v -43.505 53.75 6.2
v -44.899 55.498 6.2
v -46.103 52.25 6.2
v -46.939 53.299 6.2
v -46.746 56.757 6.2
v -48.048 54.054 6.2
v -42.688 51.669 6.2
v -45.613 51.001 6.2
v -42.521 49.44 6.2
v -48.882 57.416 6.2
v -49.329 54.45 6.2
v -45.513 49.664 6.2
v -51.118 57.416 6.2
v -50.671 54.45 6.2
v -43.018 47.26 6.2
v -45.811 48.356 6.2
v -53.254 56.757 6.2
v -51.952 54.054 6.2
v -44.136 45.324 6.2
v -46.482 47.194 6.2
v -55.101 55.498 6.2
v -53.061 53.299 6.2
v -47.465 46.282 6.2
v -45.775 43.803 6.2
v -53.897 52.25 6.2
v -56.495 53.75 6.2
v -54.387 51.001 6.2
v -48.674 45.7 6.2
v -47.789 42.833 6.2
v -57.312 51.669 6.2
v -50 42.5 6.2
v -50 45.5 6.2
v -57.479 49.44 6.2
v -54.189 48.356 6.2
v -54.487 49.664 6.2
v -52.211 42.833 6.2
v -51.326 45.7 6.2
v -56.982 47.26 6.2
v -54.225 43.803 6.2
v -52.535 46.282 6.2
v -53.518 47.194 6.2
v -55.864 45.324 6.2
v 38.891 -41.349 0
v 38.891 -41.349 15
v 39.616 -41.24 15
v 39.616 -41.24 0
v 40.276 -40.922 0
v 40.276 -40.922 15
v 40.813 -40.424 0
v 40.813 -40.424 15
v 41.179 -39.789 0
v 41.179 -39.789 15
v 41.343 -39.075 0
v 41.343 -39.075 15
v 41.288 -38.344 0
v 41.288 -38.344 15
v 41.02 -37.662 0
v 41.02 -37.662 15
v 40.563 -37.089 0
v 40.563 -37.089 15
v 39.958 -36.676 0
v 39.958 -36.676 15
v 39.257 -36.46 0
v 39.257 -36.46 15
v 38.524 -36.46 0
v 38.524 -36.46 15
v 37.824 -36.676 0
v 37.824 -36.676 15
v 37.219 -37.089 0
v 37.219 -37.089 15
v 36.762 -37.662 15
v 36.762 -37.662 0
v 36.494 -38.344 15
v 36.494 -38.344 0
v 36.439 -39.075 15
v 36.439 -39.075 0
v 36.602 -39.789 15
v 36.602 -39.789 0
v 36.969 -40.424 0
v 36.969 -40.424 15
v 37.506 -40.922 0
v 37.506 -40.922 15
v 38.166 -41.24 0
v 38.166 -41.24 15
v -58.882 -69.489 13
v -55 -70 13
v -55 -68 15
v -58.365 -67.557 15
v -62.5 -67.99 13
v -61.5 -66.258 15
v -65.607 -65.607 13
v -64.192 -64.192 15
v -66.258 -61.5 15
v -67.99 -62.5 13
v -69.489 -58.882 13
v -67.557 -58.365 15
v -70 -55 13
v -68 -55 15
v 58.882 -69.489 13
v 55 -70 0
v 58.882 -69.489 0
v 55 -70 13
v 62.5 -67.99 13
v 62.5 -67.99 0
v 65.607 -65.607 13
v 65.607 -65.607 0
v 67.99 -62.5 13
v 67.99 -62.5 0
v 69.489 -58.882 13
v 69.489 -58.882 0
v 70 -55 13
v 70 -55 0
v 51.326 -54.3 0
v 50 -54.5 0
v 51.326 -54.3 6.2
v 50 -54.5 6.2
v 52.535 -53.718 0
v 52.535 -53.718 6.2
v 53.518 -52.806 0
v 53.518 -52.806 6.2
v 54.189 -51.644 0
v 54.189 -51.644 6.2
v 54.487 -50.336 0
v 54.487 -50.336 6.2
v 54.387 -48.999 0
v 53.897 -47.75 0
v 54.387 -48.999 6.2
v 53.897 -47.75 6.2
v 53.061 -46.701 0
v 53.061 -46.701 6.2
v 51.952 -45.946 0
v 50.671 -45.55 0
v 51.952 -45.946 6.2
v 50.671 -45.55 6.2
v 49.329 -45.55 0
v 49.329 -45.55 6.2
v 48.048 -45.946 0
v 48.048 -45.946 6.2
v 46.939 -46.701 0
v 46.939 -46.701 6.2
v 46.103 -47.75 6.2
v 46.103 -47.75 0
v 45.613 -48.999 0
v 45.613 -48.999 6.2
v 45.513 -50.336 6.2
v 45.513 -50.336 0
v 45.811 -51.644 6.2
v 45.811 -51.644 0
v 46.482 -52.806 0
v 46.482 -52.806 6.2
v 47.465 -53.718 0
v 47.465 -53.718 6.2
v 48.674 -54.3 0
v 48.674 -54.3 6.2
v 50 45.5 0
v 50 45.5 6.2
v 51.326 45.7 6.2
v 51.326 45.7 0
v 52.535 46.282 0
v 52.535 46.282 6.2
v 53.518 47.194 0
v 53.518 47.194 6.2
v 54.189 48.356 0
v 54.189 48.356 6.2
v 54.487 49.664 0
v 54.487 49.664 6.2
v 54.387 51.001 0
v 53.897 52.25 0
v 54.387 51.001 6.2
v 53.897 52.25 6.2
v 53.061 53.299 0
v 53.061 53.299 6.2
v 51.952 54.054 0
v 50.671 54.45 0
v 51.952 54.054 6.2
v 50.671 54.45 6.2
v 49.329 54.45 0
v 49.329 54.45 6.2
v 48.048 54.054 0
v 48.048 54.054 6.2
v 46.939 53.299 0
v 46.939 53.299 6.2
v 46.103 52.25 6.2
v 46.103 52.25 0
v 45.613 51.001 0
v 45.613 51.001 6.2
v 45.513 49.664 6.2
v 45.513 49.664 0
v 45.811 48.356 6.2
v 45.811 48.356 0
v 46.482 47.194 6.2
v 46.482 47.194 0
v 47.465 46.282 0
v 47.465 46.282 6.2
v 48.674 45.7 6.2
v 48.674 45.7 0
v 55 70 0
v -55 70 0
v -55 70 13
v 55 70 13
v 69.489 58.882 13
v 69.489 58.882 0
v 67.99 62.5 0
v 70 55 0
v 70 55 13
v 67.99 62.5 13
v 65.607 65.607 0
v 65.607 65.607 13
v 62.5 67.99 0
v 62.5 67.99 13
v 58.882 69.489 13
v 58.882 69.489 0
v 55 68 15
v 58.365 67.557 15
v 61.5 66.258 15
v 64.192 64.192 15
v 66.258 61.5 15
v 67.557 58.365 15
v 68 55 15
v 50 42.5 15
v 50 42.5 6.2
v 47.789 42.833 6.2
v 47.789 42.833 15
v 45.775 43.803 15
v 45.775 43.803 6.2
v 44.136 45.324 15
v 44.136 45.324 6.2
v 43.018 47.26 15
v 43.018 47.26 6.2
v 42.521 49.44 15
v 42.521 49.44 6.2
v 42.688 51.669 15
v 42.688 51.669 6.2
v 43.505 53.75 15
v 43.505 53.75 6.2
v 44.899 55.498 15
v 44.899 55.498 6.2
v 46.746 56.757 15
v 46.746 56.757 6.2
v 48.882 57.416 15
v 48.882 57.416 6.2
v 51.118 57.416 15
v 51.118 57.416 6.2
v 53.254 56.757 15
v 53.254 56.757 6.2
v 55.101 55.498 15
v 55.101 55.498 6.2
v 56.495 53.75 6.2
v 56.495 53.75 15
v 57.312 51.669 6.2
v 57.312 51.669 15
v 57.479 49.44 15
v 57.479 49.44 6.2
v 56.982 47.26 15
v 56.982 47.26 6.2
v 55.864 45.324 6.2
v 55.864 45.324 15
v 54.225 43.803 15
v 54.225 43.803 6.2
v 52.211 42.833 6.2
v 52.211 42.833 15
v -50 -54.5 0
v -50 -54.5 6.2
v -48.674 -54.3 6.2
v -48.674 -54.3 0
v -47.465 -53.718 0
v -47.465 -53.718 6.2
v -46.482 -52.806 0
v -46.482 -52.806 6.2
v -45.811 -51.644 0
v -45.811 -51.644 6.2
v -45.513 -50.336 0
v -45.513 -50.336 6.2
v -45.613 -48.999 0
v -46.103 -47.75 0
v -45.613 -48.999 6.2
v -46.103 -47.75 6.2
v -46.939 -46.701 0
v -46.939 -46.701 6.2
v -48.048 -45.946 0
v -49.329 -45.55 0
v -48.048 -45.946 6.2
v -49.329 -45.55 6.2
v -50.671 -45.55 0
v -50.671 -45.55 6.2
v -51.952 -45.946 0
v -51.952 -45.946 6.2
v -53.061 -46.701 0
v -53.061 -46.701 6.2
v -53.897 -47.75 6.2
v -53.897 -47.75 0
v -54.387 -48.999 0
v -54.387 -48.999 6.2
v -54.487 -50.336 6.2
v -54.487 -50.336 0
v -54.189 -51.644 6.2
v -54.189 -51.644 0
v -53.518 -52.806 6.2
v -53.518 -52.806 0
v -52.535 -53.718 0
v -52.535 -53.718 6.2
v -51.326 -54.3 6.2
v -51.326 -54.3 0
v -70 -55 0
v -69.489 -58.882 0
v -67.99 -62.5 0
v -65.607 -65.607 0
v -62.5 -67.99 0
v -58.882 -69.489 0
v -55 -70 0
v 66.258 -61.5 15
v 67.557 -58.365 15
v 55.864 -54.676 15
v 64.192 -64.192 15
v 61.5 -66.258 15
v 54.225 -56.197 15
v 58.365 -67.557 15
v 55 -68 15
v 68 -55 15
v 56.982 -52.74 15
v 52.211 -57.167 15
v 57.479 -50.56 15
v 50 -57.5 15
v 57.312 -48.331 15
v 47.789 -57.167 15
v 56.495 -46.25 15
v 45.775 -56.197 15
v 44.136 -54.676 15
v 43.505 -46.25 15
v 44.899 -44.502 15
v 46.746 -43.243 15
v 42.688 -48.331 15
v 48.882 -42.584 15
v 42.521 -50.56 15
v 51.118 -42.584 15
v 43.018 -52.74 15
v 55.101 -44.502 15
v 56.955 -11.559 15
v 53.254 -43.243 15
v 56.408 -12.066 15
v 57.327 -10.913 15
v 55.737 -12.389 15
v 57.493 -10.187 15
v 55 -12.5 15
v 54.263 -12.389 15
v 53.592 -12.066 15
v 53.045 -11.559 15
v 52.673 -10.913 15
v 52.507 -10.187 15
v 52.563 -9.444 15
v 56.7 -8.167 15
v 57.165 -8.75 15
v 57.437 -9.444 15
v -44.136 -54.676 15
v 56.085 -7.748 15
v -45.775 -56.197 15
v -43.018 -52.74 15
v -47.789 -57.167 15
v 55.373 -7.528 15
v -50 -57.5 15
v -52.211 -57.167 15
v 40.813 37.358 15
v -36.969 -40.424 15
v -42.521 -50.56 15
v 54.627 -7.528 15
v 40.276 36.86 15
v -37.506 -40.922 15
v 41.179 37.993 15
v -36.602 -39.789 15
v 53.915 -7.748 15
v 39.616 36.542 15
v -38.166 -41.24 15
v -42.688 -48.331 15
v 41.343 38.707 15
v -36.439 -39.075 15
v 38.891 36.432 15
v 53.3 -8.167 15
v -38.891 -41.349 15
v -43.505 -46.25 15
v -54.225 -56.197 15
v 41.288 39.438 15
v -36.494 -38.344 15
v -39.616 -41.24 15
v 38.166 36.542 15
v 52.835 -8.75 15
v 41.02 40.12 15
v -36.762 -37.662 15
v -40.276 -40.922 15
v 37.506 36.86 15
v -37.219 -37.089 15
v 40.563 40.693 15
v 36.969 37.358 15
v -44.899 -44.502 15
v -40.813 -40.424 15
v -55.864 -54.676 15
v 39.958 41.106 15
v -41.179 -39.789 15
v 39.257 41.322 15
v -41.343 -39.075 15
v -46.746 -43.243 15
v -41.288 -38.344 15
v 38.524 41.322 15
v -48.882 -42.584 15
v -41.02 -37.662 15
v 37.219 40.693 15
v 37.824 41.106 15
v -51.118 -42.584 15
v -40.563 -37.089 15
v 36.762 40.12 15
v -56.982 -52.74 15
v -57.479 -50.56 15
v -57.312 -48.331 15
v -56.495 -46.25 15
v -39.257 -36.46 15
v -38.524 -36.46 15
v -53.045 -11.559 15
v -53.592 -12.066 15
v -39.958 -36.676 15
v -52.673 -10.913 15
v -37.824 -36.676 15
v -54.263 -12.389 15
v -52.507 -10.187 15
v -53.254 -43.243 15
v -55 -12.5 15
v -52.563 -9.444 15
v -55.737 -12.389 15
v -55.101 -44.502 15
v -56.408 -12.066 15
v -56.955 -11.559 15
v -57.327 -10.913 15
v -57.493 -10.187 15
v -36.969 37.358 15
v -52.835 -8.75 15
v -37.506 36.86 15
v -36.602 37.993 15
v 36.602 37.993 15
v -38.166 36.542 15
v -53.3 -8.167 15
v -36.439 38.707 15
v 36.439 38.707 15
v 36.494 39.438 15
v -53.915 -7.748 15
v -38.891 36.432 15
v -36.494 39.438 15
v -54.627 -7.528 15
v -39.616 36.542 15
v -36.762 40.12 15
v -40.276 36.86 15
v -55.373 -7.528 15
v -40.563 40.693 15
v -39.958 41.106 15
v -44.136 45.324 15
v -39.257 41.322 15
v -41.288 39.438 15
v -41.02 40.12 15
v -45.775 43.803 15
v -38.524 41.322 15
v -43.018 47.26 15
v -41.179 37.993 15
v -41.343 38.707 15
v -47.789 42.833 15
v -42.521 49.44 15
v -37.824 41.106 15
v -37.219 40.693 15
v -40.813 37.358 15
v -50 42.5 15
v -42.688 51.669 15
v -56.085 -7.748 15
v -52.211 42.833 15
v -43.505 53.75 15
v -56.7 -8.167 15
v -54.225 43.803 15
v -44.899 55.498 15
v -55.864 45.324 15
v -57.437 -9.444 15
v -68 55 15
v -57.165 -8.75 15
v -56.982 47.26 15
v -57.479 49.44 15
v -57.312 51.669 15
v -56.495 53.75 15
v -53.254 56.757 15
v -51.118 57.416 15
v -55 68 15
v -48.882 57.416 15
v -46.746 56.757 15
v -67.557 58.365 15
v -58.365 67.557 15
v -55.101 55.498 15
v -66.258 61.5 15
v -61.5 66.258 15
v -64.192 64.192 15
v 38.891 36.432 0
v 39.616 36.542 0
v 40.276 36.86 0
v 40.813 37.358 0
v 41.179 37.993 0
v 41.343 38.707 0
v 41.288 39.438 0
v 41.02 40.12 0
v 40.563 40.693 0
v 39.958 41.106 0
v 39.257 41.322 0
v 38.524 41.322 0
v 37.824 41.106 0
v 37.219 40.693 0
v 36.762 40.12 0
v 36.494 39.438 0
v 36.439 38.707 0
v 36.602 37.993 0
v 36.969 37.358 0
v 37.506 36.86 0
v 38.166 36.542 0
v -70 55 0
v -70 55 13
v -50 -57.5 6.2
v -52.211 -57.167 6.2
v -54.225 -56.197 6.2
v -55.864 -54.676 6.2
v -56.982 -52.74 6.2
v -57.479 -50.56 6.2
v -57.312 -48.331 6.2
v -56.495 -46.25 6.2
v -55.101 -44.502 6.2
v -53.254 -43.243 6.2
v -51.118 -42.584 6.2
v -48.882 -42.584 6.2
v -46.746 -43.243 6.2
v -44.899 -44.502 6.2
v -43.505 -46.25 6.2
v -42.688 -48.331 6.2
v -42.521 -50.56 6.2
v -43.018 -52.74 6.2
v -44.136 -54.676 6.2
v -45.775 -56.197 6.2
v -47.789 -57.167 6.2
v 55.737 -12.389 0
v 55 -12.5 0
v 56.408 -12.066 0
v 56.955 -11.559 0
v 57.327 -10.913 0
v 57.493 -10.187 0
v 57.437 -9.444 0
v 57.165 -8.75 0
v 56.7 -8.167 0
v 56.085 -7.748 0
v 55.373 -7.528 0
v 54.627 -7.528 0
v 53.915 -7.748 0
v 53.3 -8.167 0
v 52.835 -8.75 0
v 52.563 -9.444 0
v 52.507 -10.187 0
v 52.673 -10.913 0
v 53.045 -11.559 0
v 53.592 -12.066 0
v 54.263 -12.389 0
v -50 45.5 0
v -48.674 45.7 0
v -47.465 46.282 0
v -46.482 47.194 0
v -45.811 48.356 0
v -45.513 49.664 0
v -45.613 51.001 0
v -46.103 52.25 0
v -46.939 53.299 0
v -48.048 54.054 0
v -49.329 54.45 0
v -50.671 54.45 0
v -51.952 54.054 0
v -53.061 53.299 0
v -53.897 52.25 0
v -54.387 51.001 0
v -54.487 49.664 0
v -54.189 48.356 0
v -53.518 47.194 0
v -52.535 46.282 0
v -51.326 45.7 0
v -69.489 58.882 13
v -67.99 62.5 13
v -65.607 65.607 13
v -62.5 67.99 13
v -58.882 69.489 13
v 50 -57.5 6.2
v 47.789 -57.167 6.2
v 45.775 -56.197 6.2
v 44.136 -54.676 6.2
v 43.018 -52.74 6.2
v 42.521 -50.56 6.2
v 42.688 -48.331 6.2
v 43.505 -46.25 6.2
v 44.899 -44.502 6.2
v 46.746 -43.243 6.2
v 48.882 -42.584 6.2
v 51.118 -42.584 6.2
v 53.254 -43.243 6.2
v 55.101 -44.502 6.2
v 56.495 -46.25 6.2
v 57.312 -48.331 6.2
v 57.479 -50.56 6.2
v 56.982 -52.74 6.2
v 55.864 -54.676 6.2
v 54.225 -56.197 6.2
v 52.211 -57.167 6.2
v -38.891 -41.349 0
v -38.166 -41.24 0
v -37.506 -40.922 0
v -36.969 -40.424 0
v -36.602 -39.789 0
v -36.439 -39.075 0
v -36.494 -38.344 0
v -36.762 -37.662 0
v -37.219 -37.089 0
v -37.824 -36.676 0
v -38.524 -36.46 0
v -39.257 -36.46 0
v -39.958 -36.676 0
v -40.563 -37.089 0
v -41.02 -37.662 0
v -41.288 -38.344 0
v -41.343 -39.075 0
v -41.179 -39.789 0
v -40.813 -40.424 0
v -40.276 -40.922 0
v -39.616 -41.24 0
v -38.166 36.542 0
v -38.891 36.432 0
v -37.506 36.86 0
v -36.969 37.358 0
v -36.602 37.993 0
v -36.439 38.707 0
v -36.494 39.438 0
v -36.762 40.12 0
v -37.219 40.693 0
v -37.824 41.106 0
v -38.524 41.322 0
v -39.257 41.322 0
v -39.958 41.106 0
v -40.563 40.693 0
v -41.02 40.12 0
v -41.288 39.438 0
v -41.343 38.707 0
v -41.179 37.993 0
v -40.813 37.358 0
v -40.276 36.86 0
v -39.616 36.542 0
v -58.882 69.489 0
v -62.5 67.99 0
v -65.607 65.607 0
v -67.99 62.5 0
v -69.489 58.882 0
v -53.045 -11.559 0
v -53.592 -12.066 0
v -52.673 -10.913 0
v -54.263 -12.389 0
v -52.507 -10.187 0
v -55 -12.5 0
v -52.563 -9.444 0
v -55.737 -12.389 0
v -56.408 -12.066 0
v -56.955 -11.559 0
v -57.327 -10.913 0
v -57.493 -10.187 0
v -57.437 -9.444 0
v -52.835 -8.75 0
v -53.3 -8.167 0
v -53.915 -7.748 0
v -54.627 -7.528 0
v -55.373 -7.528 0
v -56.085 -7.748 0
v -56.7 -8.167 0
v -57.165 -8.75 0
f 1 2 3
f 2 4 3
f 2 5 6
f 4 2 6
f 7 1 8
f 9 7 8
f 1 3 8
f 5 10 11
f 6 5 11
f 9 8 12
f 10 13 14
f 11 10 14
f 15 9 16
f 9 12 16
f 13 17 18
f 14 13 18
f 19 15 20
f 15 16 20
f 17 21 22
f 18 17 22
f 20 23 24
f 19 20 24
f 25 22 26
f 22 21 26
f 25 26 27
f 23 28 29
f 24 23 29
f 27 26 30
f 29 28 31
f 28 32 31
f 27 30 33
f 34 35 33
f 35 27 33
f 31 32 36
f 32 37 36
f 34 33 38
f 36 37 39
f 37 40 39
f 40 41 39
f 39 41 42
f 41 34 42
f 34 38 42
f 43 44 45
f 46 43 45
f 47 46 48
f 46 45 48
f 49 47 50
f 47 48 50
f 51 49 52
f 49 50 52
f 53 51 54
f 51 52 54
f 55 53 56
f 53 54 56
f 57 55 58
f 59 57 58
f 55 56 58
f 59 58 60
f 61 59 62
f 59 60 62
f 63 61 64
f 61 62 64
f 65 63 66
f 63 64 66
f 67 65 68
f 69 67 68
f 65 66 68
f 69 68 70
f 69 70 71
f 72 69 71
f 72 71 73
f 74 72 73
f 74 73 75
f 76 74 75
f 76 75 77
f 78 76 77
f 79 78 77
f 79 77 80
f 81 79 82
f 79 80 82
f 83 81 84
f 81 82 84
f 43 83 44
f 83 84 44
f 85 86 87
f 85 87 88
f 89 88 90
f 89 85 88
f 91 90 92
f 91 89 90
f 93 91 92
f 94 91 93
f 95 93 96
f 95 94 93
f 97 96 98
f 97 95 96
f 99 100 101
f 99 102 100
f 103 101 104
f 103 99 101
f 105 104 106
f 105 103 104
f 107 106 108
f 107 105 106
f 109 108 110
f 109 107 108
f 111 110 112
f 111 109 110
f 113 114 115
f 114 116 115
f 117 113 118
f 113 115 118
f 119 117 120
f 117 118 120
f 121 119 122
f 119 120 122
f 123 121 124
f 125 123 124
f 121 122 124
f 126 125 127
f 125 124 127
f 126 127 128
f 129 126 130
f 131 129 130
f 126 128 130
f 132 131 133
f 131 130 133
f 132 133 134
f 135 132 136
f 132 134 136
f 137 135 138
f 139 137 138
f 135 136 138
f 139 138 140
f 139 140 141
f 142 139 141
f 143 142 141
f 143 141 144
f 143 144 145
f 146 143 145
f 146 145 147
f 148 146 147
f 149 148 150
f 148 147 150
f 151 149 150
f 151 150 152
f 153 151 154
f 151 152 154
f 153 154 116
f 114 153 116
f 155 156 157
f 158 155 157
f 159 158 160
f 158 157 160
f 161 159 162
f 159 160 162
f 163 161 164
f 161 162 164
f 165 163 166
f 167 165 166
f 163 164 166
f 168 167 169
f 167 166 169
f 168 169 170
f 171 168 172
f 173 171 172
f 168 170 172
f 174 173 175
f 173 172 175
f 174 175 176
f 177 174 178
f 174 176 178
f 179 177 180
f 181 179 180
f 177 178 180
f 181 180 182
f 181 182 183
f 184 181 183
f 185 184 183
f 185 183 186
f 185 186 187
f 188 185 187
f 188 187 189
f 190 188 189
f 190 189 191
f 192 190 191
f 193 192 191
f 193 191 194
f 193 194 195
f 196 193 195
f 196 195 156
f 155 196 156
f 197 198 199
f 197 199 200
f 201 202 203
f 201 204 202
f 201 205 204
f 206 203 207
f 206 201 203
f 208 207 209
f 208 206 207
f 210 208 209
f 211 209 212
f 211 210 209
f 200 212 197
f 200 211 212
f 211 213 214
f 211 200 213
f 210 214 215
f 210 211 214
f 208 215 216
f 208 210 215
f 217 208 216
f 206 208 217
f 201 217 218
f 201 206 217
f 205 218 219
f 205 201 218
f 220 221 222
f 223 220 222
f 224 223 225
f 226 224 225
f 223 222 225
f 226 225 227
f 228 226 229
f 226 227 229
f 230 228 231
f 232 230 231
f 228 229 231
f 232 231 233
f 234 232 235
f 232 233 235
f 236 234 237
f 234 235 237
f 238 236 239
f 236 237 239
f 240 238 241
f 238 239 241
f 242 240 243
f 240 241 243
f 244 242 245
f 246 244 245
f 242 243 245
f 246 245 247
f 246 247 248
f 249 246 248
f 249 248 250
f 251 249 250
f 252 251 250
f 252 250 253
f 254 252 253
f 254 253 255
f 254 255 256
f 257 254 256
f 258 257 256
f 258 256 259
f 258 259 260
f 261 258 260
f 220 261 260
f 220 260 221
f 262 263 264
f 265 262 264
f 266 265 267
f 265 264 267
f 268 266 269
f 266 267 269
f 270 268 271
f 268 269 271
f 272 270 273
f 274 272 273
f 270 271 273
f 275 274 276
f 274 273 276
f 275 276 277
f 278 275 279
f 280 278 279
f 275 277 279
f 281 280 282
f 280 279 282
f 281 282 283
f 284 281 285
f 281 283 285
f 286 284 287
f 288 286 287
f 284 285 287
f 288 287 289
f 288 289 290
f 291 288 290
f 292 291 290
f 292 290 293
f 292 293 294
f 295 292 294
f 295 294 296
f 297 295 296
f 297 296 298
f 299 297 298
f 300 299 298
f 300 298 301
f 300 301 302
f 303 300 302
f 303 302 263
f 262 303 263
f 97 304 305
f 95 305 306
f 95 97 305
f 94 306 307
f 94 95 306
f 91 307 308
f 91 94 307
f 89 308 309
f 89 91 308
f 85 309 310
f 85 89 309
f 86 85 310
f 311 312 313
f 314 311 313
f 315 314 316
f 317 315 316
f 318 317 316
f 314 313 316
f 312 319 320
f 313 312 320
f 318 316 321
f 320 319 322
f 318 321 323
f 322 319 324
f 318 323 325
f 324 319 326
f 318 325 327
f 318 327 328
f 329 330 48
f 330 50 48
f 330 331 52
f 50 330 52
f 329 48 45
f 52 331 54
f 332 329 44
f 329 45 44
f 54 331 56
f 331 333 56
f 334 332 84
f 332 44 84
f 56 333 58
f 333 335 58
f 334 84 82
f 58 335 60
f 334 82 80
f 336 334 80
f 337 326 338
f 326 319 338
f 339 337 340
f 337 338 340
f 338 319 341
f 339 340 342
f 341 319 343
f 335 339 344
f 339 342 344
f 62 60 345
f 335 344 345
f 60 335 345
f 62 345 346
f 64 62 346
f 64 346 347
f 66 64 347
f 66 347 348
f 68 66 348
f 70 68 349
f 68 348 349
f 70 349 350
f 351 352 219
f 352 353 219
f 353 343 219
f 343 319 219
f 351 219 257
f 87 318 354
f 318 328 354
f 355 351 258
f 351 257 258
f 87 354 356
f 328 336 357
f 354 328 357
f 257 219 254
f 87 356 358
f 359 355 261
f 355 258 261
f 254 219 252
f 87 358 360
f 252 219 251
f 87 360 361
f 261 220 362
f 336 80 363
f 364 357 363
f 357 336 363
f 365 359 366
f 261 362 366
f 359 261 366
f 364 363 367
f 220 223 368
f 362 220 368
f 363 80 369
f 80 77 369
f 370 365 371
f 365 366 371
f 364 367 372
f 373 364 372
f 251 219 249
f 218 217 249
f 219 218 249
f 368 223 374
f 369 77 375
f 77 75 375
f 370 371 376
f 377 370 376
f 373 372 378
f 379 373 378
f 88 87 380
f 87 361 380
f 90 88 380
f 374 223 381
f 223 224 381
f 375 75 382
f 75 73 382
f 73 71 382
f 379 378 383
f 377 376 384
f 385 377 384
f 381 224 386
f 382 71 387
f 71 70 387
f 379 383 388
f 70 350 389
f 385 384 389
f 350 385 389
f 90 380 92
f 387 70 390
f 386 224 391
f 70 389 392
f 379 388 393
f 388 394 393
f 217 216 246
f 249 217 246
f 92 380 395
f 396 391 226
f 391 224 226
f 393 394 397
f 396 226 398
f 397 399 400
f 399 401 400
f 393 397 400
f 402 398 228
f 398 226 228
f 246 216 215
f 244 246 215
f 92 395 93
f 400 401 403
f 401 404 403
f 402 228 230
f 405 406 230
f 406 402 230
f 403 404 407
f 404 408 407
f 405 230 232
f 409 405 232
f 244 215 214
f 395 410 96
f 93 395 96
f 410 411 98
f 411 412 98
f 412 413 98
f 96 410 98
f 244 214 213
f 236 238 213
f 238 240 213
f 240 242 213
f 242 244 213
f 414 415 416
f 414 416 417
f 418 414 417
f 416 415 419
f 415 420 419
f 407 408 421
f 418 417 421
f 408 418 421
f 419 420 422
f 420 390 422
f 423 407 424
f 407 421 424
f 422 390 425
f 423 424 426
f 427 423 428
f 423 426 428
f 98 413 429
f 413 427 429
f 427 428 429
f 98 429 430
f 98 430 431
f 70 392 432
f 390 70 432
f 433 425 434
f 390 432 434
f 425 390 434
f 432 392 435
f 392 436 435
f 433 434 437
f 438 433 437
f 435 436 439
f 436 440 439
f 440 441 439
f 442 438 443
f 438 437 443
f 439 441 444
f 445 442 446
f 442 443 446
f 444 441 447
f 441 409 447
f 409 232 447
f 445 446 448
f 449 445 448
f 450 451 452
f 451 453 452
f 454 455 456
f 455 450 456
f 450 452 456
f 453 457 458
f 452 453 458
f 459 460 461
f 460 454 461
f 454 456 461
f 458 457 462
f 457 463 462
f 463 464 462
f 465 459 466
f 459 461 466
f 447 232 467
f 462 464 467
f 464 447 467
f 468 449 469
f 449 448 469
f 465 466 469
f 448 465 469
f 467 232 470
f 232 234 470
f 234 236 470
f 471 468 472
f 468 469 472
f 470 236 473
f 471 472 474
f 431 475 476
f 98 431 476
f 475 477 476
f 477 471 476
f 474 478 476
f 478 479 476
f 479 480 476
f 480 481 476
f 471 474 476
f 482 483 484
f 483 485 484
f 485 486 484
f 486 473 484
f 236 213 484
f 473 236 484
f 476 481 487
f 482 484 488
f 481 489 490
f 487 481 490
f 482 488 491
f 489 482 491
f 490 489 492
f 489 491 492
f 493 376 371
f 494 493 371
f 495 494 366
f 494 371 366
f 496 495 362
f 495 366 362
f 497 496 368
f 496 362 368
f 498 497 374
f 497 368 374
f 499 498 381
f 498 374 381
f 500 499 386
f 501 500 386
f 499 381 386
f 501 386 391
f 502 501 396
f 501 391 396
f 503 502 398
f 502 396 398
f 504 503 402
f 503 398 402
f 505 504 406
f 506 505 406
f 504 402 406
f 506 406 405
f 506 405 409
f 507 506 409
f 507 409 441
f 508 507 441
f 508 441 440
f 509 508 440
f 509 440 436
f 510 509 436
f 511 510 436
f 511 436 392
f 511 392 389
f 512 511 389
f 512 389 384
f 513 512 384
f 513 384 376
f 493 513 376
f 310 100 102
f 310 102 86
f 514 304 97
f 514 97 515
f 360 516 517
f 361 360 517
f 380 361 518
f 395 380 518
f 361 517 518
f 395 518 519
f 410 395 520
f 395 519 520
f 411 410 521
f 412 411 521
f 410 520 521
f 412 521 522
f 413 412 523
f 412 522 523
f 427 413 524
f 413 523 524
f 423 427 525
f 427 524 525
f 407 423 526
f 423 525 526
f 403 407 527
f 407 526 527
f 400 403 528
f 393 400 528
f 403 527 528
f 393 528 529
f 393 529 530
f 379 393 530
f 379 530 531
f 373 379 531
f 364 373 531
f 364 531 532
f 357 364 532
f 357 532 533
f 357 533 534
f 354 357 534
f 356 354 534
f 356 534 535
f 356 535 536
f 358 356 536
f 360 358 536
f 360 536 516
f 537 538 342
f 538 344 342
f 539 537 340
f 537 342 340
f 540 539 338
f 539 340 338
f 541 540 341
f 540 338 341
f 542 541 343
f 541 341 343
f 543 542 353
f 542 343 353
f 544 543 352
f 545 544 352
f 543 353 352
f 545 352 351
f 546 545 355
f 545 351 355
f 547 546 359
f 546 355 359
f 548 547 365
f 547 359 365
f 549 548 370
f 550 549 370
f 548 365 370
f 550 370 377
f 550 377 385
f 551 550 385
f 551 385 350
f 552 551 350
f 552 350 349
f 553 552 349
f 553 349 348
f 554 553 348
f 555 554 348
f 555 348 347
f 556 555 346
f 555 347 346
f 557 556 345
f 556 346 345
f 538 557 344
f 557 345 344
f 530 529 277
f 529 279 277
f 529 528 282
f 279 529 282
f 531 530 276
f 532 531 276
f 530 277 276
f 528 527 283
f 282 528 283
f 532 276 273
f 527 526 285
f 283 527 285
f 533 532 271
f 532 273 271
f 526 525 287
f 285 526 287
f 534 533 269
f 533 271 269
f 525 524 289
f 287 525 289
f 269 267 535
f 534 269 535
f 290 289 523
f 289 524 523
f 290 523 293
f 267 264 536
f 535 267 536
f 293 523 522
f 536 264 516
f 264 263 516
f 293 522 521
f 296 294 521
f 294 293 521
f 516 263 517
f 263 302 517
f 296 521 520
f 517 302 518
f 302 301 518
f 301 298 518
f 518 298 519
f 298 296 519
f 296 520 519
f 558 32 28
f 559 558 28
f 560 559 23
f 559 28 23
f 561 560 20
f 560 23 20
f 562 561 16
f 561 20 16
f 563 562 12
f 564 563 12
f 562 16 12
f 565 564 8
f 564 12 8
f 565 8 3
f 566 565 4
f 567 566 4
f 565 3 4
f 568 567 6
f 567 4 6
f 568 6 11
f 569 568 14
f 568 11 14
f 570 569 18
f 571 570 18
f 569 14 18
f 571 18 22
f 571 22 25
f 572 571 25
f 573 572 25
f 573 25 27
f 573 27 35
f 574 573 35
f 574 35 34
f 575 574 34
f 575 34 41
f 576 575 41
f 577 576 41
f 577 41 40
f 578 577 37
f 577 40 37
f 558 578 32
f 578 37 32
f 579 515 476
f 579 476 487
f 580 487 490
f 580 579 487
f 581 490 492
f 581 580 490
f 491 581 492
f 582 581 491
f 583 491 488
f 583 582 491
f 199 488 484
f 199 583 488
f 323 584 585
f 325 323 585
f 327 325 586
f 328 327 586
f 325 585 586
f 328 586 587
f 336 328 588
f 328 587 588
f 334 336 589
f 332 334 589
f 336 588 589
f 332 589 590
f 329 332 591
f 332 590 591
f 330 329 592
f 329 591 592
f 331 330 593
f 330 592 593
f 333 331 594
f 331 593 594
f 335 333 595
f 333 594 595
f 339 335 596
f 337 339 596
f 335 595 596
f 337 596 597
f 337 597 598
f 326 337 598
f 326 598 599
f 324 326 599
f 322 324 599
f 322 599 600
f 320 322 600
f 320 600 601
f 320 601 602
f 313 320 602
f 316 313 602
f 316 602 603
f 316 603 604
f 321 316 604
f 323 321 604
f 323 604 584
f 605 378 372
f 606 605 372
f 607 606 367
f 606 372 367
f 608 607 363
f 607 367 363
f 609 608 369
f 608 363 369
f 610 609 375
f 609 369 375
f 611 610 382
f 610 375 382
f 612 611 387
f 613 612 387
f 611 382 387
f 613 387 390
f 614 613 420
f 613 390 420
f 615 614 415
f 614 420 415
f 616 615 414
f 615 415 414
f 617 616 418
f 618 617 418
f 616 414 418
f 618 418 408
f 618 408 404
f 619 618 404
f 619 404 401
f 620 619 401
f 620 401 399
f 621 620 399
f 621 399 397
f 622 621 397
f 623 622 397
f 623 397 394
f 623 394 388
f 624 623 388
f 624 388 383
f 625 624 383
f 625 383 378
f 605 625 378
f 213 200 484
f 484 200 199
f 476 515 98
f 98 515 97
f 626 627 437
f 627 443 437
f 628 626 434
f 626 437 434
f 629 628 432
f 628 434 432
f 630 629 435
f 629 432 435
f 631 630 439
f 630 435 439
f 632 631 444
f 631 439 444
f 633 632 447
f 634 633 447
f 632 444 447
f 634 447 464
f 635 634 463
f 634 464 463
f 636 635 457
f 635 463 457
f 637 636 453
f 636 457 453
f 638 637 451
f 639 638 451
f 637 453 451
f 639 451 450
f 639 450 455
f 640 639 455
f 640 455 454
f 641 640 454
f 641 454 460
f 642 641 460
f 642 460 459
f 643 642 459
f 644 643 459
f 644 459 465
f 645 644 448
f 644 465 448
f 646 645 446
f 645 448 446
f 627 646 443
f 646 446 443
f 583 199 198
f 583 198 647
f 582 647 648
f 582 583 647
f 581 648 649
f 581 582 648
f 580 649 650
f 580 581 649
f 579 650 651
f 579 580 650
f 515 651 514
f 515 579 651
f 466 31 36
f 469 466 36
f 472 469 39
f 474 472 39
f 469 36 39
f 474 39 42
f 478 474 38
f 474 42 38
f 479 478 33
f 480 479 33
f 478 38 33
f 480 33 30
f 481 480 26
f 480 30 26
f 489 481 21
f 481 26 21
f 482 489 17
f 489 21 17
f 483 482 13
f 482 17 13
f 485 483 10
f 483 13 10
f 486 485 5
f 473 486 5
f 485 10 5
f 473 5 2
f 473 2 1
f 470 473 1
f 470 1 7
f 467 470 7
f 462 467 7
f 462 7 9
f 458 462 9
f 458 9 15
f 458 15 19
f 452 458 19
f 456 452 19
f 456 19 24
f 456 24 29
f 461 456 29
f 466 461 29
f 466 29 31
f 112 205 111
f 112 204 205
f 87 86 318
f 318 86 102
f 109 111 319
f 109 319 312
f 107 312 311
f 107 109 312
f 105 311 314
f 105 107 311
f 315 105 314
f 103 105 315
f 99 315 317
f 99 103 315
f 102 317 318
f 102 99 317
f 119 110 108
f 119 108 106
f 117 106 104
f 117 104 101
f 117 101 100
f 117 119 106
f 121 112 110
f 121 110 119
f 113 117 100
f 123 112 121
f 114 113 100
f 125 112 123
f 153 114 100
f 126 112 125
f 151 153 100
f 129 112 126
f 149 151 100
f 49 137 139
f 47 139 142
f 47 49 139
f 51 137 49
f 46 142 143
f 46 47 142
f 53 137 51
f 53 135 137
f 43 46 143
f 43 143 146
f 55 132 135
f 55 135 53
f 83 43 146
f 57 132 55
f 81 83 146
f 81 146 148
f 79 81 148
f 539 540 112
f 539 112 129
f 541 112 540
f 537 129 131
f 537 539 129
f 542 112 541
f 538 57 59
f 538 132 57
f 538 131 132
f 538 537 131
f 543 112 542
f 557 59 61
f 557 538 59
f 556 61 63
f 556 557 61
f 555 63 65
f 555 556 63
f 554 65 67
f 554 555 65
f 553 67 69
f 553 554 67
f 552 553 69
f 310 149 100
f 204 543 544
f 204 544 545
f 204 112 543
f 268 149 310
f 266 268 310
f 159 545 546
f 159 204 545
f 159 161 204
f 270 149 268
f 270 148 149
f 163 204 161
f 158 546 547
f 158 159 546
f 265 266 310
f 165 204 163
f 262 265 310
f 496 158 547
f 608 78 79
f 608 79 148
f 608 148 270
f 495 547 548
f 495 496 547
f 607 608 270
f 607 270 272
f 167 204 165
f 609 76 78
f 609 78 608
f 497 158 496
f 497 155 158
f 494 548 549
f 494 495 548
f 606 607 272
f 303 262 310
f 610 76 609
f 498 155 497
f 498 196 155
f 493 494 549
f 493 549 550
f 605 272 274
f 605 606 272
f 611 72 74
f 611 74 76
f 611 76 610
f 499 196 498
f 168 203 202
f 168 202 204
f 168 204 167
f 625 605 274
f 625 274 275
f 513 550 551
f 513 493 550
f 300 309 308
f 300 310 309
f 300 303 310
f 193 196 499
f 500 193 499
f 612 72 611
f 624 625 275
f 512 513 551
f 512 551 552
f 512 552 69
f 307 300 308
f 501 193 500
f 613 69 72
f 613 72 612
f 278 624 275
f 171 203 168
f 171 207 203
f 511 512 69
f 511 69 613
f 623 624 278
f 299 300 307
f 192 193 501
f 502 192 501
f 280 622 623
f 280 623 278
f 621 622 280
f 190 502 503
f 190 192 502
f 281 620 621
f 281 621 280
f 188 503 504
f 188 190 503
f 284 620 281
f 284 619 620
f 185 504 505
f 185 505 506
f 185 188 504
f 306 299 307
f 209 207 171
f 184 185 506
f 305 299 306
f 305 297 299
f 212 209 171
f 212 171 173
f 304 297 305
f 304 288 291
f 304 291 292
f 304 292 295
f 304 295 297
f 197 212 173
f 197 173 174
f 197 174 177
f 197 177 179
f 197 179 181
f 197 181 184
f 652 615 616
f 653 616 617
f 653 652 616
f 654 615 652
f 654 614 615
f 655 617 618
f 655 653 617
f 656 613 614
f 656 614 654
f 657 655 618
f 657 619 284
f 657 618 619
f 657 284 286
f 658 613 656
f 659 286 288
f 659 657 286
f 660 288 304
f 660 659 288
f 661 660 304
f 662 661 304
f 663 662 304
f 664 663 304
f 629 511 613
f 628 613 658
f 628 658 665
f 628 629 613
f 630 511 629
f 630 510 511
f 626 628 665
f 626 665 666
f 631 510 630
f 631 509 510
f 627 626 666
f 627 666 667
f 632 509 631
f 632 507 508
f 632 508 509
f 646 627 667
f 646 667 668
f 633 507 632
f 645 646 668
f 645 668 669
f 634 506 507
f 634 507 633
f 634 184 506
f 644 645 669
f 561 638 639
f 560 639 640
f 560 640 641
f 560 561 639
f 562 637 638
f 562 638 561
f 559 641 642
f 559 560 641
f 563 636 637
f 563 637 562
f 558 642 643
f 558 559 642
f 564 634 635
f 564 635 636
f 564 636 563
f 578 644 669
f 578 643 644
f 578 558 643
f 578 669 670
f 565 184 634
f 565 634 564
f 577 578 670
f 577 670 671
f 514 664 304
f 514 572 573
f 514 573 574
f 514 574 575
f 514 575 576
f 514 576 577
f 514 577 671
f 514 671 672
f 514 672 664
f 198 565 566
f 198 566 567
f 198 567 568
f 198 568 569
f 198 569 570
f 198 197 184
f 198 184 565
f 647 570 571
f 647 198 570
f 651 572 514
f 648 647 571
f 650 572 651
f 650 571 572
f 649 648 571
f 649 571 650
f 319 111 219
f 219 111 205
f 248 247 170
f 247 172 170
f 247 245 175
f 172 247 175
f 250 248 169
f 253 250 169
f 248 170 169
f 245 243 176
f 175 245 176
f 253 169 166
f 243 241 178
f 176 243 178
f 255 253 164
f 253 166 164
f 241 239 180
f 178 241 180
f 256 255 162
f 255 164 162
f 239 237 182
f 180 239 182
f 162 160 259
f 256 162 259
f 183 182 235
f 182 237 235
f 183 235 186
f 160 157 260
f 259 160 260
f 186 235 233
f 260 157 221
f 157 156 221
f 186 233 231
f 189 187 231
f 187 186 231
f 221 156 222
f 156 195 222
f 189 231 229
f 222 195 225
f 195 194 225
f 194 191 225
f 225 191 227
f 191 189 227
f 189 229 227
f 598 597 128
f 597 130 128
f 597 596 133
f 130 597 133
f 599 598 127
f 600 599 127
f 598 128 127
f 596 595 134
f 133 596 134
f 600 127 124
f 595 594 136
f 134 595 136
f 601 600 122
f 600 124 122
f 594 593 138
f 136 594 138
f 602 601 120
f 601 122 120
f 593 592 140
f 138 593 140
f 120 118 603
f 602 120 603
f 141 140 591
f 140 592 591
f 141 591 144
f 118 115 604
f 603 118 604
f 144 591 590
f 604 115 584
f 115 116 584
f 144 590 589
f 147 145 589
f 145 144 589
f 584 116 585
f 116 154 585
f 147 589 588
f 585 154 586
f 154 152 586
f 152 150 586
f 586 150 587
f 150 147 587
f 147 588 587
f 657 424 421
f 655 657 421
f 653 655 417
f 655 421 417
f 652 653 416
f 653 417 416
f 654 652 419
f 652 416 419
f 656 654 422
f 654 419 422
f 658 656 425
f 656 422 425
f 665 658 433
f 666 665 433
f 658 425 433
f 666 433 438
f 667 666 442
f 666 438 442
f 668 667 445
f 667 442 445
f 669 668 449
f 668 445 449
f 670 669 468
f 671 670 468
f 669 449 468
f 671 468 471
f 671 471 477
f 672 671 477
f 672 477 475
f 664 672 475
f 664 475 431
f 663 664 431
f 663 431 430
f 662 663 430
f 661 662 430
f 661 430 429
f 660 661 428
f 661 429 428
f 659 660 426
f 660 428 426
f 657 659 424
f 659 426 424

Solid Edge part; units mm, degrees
sketch "Sketch1" plane through (0, 0, 0) normal (0, 0, 1) x (1, 0, 0)
  line L0 (-70, 70) -> (70, 70)
  line L1 (70, 70) -> (70, -70)
  line L2 (70, -70) -> (-70, -70)
  line L3 (-70, -70) -> (-70, 70)
  dimension "D1" = 140
  dimension "D2" = 140
extrude "Protrusion1" add sketch "Sketch1" along normal blind 15
hole "Hole_1" at (38.8909, 38.8909, 15) direction (0, 0, -1) diameter 4.917 end up to next thread major 6 thread length 2
hole "Hole1" at (38.8909, -38.8909, 15) direction (0, 0, -1) diameter 4.917 end up to next thread major 6 thread length 2
hole "Hole2" at (-38.8909, -38.8909, 15) direction (0, 0, -1) diameter 4.917 end up to next thread major 6 thread length 2
hole "Hole3" at (-38.8909, 38.8909, 15) direction (0, 0, -1) diameter 4.917 end up to next thread major 6 thread length 2
hole "Hole_5" at (50, 50, 15) direction (0, 0, -1) diameter 9 end up to next counterbore diameter 15 counterbore depth 8.8
hole "Hole4" at (-50, 50, 15) direction (0, 0, -1) diameter 9 end up to next counterbore diameter 15 counterbore depth 8.8
hole "Hole5" at (-50, -50, 15) direction (0, 0, -1) diameter 9 end up to next counterbore diameter 15 counterbore depth 8.8
hole "Hole6" at (50, -50, 15) direction (0, 0, -1) diameter 9 end up to next counterbore diameter 15 counterbore depth 8.8
hole "Hole_9" at (55, -10, 15) direction (0, 0, -1) diameter 5 end up to next
hole "Hole7" at (-55, -10, 15) direction (0, 0, -1) diameter 5 end up to next
fillet "Round_1" radius 15 4 edges at (-70, 70, 7.5) (70, -70, 7.5) (-70, -70, 7.5) (70, 70, 7.5)
chamfer "Chamfer_2" distance 2 angle 45 7 edges at (-70, 0, 15) (0, 70, 15) (65.6066, 65.6066, 15) (70, 0, 15) (65.6066, -65.6066, 15) (0, -70, 15) (-65.6066, -65.6066, 15)
